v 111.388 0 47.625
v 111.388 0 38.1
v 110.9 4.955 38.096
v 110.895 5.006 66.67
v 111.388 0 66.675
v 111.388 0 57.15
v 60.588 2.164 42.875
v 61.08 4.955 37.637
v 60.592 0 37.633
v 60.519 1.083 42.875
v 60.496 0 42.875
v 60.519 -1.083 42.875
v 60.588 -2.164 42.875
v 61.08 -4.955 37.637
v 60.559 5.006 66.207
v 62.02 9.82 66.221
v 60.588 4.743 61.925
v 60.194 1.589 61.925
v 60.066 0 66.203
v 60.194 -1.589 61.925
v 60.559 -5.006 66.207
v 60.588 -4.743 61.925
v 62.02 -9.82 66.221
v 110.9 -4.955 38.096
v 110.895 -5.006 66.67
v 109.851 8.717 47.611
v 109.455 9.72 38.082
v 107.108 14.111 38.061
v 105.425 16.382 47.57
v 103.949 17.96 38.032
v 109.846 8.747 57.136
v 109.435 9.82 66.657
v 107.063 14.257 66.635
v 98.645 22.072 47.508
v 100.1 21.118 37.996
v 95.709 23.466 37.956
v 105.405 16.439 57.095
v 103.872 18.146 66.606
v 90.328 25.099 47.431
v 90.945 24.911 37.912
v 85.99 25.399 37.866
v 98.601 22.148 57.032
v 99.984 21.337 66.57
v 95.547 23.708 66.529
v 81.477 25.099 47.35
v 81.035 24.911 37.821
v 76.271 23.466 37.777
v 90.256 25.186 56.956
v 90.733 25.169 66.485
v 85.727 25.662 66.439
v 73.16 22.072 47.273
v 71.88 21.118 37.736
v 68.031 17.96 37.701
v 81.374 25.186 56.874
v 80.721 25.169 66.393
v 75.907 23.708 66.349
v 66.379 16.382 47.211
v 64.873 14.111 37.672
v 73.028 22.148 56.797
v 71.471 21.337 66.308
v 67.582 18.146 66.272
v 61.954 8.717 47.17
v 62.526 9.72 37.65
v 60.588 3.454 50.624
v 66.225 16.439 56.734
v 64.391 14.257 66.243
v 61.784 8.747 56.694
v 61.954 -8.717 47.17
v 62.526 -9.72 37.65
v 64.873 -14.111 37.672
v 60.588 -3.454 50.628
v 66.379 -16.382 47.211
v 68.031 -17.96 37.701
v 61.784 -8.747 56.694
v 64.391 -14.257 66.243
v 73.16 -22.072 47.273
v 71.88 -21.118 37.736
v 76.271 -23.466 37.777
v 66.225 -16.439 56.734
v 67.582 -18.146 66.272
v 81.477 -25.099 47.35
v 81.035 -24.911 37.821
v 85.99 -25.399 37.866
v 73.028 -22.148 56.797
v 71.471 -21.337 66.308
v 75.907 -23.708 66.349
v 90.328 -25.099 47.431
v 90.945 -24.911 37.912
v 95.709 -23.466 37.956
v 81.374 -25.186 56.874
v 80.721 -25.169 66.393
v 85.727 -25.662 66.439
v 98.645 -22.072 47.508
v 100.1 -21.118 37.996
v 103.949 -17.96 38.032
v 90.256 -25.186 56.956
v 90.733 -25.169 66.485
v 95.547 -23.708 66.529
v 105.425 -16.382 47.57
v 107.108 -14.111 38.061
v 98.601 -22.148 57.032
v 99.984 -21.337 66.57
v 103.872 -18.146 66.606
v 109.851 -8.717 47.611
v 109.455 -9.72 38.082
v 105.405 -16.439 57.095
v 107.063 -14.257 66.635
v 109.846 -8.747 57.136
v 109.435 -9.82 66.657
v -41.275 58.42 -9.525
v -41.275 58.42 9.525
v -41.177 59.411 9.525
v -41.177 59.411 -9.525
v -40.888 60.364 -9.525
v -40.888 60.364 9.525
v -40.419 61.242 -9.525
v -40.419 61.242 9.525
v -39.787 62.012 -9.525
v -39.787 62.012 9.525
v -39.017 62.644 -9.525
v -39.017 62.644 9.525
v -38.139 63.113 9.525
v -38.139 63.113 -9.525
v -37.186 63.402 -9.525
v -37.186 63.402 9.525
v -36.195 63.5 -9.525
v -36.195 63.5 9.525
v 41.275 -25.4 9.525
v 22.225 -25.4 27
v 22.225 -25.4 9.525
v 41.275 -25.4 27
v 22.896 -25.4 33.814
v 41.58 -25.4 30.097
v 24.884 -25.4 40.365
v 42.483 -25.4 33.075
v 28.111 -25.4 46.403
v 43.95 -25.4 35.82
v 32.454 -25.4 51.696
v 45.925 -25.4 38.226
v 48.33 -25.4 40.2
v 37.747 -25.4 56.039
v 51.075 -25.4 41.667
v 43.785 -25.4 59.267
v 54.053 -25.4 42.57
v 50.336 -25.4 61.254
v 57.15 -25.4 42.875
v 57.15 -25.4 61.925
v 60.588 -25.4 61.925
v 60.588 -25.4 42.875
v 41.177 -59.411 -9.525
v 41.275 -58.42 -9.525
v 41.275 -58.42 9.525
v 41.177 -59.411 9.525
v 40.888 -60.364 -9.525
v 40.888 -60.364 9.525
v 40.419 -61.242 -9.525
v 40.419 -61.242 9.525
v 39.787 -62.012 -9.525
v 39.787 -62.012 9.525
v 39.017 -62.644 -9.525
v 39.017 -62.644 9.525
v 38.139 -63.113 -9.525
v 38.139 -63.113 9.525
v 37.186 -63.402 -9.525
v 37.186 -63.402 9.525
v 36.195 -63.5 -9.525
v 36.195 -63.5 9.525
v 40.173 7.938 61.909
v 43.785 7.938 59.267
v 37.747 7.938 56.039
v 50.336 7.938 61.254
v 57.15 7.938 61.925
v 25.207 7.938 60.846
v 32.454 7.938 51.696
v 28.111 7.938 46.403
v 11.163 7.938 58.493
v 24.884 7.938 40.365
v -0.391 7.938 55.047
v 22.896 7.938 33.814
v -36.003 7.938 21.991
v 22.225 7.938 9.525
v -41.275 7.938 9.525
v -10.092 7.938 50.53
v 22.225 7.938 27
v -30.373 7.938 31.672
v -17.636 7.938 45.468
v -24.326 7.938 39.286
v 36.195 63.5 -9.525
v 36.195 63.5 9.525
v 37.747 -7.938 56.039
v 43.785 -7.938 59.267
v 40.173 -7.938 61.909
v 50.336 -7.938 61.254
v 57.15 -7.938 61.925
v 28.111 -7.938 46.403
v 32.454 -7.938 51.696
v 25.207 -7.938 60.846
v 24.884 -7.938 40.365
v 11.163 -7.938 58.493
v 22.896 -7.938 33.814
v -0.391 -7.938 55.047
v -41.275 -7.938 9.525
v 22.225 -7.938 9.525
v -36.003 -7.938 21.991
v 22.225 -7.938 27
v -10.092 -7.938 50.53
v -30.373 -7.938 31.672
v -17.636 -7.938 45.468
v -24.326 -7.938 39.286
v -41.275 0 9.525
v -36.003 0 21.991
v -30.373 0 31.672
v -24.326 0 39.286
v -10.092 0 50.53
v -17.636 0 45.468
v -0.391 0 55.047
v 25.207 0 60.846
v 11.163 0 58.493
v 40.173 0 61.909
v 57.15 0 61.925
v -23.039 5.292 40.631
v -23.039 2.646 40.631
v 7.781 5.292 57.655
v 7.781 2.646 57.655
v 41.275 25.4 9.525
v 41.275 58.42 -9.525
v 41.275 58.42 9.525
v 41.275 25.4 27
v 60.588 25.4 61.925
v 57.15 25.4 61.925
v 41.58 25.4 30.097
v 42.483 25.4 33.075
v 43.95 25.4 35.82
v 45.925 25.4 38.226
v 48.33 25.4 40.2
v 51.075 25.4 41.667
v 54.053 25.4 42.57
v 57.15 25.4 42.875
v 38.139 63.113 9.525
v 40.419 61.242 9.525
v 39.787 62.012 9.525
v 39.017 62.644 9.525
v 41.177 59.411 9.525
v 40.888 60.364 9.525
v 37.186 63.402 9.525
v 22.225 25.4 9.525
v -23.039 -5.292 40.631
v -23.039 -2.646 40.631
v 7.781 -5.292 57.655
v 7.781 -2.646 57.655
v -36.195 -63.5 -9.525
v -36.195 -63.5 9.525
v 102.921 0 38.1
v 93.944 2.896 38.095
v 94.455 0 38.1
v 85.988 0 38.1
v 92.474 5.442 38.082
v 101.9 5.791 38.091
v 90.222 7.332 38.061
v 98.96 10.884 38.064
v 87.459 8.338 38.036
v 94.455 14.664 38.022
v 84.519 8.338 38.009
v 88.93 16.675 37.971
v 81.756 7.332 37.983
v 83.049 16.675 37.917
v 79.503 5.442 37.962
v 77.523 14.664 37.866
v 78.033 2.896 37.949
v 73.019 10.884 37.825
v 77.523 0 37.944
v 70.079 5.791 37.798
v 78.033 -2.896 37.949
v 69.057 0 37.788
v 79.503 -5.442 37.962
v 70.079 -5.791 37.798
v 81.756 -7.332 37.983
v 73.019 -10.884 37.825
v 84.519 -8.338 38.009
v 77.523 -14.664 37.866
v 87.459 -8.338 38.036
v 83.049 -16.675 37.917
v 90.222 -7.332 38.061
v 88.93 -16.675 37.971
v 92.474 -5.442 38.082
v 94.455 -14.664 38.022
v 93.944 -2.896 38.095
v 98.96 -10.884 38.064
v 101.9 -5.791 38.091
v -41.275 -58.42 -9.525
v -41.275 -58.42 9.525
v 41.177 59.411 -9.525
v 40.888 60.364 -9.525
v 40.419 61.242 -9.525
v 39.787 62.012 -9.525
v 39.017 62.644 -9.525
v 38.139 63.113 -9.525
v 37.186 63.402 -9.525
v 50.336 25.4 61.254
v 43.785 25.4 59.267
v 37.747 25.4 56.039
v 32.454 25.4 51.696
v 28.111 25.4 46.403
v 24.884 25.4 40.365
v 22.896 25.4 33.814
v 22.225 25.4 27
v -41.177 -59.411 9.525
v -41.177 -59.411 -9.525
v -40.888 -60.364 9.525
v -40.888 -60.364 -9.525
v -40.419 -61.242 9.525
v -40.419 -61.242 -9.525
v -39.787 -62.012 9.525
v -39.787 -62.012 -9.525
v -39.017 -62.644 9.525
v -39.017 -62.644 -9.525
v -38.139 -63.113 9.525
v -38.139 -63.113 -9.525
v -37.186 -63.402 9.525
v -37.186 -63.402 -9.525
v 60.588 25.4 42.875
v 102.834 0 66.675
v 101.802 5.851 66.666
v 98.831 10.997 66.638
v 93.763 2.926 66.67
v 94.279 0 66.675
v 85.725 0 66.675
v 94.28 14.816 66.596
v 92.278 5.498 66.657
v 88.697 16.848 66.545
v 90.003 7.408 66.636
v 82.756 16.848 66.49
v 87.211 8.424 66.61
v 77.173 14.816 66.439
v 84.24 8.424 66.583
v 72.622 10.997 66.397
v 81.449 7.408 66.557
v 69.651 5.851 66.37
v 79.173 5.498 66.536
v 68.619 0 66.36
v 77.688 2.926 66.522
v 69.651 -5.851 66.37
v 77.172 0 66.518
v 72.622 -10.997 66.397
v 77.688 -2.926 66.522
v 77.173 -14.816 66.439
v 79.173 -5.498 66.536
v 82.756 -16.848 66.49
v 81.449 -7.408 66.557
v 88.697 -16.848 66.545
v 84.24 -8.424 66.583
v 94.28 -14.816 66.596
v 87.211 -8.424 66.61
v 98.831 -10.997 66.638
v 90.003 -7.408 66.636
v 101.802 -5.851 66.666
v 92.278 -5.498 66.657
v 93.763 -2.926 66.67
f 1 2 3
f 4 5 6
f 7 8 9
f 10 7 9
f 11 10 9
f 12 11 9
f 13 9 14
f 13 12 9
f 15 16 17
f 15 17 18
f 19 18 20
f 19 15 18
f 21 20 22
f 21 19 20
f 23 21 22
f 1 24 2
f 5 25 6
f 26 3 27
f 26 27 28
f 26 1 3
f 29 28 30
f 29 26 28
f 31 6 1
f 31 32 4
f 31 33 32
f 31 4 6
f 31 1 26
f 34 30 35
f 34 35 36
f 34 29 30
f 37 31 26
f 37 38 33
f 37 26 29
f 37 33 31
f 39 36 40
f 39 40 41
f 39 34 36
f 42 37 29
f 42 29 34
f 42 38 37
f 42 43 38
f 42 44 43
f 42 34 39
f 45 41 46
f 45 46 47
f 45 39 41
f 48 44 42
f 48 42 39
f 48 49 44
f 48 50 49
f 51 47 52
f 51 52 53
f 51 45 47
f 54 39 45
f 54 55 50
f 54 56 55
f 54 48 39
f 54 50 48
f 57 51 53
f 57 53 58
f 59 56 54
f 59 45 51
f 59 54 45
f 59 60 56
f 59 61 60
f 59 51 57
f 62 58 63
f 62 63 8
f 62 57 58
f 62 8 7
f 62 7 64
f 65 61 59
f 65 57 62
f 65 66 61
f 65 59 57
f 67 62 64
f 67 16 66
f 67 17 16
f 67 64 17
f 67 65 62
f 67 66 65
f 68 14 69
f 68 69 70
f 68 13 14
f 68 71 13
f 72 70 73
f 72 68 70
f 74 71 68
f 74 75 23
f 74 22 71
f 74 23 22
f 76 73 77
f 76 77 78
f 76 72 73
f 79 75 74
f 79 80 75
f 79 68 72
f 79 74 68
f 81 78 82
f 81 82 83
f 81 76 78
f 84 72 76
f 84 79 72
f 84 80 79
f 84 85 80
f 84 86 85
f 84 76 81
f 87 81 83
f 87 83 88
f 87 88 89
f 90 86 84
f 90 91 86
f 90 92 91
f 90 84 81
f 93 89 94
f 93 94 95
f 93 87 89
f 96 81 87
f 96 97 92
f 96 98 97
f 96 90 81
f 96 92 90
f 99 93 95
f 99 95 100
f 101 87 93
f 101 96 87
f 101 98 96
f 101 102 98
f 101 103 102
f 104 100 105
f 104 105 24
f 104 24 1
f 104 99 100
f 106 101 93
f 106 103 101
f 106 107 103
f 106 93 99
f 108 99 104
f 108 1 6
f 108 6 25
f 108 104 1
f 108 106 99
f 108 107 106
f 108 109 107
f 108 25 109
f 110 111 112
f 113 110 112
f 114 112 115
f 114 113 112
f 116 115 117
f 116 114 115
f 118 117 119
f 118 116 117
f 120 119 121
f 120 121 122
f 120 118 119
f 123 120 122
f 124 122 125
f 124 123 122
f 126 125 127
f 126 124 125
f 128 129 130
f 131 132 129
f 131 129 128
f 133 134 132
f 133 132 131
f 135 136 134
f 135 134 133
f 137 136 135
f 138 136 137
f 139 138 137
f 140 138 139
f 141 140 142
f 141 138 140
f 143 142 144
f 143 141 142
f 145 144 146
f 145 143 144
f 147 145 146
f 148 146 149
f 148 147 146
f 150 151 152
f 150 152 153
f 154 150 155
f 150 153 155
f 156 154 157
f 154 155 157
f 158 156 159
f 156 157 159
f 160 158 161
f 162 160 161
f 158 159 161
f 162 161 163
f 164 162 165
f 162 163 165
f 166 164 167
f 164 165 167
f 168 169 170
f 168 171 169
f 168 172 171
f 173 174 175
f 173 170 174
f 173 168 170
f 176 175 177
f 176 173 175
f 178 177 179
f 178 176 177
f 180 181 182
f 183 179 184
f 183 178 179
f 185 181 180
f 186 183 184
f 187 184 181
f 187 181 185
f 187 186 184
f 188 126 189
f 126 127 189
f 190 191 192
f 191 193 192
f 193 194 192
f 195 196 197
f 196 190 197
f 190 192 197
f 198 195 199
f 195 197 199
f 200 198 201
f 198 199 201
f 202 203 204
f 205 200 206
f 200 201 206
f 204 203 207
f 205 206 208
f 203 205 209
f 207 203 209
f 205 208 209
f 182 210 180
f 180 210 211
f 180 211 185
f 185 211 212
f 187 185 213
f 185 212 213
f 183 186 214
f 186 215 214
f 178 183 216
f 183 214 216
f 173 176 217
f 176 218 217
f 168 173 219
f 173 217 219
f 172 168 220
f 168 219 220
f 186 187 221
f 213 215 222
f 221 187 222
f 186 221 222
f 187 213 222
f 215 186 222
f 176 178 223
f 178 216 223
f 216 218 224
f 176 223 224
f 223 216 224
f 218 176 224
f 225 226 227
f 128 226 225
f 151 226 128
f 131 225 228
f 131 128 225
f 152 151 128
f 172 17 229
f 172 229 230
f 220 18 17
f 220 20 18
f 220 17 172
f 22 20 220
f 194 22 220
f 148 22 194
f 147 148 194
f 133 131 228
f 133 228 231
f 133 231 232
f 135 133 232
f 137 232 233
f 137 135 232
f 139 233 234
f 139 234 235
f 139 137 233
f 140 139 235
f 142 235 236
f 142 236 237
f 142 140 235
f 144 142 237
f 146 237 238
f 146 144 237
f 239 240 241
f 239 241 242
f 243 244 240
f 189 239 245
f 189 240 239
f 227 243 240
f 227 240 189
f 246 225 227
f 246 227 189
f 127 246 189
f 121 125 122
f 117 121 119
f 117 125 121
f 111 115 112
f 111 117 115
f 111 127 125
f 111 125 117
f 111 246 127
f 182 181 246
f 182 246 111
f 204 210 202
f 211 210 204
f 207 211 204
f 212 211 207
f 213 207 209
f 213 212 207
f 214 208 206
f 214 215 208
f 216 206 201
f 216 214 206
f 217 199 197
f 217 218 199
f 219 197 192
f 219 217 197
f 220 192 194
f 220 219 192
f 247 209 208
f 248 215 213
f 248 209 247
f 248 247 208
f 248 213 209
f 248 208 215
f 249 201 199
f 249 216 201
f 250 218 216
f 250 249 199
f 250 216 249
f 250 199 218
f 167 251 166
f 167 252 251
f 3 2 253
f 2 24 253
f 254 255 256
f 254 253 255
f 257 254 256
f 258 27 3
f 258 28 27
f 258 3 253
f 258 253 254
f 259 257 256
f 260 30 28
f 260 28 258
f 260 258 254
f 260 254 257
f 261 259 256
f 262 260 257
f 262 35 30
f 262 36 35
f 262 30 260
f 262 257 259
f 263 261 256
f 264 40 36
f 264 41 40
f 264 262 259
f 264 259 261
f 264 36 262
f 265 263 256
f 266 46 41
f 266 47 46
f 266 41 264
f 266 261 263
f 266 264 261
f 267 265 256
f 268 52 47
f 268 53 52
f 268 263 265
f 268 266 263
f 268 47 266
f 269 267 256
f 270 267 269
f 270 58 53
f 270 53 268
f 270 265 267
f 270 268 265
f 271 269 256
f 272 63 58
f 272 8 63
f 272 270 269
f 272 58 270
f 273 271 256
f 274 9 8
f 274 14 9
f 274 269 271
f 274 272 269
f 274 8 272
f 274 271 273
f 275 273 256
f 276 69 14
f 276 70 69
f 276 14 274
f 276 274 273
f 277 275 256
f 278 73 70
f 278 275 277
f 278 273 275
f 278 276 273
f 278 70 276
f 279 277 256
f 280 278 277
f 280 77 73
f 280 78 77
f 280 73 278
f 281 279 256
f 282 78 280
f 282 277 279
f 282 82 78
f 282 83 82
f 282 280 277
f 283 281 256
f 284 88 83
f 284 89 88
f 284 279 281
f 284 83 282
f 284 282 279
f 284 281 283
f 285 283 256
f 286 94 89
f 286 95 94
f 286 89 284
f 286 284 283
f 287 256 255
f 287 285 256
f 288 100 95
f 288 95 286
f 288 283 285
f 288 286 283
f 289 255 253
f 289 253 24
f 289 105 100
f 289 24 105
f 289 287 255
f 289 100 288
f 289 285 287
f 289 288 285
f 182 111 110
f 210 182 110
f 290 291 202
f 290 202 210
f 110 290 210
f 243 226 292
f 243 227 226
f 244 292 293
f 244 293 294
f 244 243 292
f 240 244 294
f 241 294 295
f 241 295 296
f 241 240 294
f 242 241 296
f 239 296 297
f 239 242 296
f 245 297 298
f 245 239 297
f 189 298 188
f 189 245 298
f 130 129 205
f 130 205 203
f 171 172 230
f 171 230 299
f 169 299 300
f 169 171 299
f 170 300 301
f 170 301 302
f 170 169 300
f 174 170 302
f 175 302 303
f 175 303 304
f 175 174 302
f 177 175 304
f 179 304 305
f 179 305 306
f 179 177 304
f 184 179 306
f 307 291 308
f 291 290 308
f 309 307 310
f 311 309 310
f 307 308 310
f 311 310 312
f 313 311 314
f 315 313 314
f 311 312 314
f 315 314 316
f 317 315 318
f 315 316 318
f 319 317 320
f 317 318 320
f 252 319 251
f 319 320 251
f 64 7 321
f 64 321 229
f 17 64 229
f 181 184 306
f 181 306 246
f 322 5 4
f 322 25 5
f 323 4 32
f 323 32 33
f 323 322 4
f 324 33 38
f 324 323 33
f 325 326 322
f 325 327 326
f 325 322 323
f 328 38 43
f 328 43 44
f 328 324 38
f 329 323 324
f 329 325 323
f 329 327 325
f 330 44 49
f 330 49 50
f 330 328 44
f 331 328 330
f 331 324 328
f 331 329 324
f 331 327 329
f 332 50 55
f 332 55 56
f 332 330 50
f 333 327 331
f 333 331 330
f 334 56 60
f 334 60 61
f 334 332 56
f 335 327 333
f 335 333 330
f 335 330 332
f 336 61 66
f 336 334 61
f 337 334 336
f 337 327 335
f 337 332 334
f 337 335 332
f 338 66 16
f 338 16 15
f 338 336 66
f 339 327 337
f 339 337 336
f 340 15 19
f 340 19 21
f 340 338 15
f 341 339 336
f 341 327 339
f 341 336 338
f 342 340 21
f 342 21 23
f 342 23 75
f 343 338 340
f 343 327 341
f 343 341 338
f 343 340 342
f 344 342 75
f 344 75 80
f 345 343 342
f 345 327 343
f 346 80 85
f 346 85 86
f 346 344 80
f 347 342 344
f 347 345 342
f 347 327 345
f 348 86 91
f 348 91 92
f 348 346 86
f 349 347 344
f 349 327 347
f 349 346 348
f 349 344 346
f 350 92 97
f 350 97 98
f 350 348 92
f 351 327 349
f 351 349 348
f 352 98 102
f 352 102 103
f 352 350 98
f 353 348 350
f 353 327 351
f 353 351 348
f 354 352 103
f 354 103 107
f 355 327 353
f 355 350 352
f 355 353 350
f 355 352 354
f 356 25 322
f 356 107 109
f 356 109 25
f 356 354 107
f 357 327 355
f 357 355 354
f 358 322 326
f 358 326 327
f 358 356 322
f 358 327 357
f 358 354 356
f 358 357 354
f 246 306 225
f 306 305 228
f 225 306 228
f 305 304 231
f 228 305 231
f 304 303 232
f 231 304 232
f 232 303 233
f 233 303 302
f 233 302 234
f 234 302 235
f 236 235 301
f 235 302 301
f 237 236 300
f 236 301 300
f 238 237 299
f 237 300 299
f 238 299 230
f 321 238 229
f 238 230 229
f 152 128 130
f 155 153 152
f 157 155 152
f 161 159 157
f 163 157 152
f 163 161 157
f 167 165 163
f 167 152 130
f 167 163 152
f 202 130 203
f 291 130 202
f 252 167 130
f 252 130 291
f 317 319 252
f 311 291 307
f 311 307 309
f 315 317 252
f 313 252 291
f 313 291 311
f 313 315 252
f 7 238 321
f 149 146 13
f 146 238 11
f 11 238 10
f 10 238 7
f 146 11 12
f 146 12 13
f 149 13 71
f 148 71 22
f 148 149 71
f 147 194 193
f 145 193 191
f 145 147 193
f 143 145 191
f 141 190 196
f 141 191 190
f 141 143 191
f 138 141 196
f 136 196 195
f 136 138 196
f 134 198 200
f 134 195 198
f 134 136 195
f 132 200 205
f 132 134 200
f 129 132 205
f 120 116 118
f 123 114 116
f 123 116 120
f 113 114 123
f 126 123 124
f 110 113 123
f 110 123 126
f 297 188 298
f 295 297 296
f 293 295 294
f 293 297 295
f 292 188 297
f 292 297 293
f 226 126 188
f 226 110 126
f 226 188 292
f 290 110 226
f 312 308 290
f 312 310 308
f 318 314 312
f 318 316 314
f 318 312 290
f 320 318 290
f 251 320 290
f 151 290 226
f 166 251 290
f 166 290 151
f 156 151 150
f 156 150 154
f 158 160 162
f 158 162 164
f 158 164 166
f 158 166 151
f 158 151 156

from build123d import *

# Parameters (mm, degrees)
F1_DEPTH = 63.5
F2_DEPTH = 25.4
F3_DEPTH = 7.9375
F5_R     = 5.08


with BuildPart() as f1:
    # F0 (on Front) → F1 (new body, symmetric)
    with BuildSketch(Plane.XZ):
        Polygon((22.2249999642, 9.525), (-41.275, 9.525), (-41.275, -9.525), (41.275, -9.525), (41.275, 9.525), align=None)
    extrude(amount=F1_DEPTH, both=True)

    # F0 (on Front) → F2 (join, symmetric)
    with BuildSketch(Plane.XZ):
        with BuildLine():
            Line((22.2249999642, 27.0002), (22.2249999642, 9.525))
            Line((22.2249999642, 9.525), (41.275, 9.525))
            Line((41.275, 9.525), (41.275, 27.0002))
            ThreePointArc((41.275, 27.0002), (45.9246798487, 38.2255201513), (57.15, 42.8752))
            Line((57.15, 42.8752), (60.587947001, 42.8752))
            Line((60.587947001, 42.8752), (60.587947001, 61.9252000358))
            Line((60.587947001, 61.9252000358), (57.15, 61.9252000358))
            ThreePointArc((57.15, 61.9252000358), (32.4542956418, 51.6959043582), (22.2249999642, 27.0002))
        make_face()
    extrude(amount=F2_DEPTH, both=True)

    # F0 (on Front) → F3 (join, symmetric)
    with BuildSketch(Plane.XZ):
        with BuildLine():
            add(Edge.make_bspline(
                [(-41.275, 9.525), (-27.342395857, 48.1158420444), (-3.4818400163, 63.5879263282), (57.15, 61.9252000358)],
                knots=[0, 0, 0, 0, 111.5045361803, 111.5045361803, 111.5045361803, 111.5045361803], degree=3))
            Line((-41.275, 9.525), (22.2249999642, 9.525))
            Line((22.2249999642, 9.525), (22.2249999642, 27.0002))
            ThreePointArc((22.2249999642, 27.0002), (32.4542956418, 51.6959043582), (57.15, 61.9252000358))
        make_face()
    extrude(amount=F3_DEPTH, both=True)

    # F0 (on Front) → F4 (revolve)
    with BuildSketch(Plane.XZ):
        Polygon((111.387947001, 66.675), (85.725, 66.675), (85.987947001, 38.1), (111.387947001, 38.1), align=None)
    revolve(axis=Axis((85.8564735005, 0, 52.3875), (-0.0092016052, 0, 0.9999576643)))

    # F5
    f5_edges = [f1.edges().sort_by_distance(p)[0] for p in [
        (41.275, -63.5, 0),
        (-41.275, -63.5, 0),
        (41.275, 63.5, 0),
        (-41.275, 63.5, 0),
    ]]
    fillet(f5_edges, radius=F5_R)


solid = f1.part
